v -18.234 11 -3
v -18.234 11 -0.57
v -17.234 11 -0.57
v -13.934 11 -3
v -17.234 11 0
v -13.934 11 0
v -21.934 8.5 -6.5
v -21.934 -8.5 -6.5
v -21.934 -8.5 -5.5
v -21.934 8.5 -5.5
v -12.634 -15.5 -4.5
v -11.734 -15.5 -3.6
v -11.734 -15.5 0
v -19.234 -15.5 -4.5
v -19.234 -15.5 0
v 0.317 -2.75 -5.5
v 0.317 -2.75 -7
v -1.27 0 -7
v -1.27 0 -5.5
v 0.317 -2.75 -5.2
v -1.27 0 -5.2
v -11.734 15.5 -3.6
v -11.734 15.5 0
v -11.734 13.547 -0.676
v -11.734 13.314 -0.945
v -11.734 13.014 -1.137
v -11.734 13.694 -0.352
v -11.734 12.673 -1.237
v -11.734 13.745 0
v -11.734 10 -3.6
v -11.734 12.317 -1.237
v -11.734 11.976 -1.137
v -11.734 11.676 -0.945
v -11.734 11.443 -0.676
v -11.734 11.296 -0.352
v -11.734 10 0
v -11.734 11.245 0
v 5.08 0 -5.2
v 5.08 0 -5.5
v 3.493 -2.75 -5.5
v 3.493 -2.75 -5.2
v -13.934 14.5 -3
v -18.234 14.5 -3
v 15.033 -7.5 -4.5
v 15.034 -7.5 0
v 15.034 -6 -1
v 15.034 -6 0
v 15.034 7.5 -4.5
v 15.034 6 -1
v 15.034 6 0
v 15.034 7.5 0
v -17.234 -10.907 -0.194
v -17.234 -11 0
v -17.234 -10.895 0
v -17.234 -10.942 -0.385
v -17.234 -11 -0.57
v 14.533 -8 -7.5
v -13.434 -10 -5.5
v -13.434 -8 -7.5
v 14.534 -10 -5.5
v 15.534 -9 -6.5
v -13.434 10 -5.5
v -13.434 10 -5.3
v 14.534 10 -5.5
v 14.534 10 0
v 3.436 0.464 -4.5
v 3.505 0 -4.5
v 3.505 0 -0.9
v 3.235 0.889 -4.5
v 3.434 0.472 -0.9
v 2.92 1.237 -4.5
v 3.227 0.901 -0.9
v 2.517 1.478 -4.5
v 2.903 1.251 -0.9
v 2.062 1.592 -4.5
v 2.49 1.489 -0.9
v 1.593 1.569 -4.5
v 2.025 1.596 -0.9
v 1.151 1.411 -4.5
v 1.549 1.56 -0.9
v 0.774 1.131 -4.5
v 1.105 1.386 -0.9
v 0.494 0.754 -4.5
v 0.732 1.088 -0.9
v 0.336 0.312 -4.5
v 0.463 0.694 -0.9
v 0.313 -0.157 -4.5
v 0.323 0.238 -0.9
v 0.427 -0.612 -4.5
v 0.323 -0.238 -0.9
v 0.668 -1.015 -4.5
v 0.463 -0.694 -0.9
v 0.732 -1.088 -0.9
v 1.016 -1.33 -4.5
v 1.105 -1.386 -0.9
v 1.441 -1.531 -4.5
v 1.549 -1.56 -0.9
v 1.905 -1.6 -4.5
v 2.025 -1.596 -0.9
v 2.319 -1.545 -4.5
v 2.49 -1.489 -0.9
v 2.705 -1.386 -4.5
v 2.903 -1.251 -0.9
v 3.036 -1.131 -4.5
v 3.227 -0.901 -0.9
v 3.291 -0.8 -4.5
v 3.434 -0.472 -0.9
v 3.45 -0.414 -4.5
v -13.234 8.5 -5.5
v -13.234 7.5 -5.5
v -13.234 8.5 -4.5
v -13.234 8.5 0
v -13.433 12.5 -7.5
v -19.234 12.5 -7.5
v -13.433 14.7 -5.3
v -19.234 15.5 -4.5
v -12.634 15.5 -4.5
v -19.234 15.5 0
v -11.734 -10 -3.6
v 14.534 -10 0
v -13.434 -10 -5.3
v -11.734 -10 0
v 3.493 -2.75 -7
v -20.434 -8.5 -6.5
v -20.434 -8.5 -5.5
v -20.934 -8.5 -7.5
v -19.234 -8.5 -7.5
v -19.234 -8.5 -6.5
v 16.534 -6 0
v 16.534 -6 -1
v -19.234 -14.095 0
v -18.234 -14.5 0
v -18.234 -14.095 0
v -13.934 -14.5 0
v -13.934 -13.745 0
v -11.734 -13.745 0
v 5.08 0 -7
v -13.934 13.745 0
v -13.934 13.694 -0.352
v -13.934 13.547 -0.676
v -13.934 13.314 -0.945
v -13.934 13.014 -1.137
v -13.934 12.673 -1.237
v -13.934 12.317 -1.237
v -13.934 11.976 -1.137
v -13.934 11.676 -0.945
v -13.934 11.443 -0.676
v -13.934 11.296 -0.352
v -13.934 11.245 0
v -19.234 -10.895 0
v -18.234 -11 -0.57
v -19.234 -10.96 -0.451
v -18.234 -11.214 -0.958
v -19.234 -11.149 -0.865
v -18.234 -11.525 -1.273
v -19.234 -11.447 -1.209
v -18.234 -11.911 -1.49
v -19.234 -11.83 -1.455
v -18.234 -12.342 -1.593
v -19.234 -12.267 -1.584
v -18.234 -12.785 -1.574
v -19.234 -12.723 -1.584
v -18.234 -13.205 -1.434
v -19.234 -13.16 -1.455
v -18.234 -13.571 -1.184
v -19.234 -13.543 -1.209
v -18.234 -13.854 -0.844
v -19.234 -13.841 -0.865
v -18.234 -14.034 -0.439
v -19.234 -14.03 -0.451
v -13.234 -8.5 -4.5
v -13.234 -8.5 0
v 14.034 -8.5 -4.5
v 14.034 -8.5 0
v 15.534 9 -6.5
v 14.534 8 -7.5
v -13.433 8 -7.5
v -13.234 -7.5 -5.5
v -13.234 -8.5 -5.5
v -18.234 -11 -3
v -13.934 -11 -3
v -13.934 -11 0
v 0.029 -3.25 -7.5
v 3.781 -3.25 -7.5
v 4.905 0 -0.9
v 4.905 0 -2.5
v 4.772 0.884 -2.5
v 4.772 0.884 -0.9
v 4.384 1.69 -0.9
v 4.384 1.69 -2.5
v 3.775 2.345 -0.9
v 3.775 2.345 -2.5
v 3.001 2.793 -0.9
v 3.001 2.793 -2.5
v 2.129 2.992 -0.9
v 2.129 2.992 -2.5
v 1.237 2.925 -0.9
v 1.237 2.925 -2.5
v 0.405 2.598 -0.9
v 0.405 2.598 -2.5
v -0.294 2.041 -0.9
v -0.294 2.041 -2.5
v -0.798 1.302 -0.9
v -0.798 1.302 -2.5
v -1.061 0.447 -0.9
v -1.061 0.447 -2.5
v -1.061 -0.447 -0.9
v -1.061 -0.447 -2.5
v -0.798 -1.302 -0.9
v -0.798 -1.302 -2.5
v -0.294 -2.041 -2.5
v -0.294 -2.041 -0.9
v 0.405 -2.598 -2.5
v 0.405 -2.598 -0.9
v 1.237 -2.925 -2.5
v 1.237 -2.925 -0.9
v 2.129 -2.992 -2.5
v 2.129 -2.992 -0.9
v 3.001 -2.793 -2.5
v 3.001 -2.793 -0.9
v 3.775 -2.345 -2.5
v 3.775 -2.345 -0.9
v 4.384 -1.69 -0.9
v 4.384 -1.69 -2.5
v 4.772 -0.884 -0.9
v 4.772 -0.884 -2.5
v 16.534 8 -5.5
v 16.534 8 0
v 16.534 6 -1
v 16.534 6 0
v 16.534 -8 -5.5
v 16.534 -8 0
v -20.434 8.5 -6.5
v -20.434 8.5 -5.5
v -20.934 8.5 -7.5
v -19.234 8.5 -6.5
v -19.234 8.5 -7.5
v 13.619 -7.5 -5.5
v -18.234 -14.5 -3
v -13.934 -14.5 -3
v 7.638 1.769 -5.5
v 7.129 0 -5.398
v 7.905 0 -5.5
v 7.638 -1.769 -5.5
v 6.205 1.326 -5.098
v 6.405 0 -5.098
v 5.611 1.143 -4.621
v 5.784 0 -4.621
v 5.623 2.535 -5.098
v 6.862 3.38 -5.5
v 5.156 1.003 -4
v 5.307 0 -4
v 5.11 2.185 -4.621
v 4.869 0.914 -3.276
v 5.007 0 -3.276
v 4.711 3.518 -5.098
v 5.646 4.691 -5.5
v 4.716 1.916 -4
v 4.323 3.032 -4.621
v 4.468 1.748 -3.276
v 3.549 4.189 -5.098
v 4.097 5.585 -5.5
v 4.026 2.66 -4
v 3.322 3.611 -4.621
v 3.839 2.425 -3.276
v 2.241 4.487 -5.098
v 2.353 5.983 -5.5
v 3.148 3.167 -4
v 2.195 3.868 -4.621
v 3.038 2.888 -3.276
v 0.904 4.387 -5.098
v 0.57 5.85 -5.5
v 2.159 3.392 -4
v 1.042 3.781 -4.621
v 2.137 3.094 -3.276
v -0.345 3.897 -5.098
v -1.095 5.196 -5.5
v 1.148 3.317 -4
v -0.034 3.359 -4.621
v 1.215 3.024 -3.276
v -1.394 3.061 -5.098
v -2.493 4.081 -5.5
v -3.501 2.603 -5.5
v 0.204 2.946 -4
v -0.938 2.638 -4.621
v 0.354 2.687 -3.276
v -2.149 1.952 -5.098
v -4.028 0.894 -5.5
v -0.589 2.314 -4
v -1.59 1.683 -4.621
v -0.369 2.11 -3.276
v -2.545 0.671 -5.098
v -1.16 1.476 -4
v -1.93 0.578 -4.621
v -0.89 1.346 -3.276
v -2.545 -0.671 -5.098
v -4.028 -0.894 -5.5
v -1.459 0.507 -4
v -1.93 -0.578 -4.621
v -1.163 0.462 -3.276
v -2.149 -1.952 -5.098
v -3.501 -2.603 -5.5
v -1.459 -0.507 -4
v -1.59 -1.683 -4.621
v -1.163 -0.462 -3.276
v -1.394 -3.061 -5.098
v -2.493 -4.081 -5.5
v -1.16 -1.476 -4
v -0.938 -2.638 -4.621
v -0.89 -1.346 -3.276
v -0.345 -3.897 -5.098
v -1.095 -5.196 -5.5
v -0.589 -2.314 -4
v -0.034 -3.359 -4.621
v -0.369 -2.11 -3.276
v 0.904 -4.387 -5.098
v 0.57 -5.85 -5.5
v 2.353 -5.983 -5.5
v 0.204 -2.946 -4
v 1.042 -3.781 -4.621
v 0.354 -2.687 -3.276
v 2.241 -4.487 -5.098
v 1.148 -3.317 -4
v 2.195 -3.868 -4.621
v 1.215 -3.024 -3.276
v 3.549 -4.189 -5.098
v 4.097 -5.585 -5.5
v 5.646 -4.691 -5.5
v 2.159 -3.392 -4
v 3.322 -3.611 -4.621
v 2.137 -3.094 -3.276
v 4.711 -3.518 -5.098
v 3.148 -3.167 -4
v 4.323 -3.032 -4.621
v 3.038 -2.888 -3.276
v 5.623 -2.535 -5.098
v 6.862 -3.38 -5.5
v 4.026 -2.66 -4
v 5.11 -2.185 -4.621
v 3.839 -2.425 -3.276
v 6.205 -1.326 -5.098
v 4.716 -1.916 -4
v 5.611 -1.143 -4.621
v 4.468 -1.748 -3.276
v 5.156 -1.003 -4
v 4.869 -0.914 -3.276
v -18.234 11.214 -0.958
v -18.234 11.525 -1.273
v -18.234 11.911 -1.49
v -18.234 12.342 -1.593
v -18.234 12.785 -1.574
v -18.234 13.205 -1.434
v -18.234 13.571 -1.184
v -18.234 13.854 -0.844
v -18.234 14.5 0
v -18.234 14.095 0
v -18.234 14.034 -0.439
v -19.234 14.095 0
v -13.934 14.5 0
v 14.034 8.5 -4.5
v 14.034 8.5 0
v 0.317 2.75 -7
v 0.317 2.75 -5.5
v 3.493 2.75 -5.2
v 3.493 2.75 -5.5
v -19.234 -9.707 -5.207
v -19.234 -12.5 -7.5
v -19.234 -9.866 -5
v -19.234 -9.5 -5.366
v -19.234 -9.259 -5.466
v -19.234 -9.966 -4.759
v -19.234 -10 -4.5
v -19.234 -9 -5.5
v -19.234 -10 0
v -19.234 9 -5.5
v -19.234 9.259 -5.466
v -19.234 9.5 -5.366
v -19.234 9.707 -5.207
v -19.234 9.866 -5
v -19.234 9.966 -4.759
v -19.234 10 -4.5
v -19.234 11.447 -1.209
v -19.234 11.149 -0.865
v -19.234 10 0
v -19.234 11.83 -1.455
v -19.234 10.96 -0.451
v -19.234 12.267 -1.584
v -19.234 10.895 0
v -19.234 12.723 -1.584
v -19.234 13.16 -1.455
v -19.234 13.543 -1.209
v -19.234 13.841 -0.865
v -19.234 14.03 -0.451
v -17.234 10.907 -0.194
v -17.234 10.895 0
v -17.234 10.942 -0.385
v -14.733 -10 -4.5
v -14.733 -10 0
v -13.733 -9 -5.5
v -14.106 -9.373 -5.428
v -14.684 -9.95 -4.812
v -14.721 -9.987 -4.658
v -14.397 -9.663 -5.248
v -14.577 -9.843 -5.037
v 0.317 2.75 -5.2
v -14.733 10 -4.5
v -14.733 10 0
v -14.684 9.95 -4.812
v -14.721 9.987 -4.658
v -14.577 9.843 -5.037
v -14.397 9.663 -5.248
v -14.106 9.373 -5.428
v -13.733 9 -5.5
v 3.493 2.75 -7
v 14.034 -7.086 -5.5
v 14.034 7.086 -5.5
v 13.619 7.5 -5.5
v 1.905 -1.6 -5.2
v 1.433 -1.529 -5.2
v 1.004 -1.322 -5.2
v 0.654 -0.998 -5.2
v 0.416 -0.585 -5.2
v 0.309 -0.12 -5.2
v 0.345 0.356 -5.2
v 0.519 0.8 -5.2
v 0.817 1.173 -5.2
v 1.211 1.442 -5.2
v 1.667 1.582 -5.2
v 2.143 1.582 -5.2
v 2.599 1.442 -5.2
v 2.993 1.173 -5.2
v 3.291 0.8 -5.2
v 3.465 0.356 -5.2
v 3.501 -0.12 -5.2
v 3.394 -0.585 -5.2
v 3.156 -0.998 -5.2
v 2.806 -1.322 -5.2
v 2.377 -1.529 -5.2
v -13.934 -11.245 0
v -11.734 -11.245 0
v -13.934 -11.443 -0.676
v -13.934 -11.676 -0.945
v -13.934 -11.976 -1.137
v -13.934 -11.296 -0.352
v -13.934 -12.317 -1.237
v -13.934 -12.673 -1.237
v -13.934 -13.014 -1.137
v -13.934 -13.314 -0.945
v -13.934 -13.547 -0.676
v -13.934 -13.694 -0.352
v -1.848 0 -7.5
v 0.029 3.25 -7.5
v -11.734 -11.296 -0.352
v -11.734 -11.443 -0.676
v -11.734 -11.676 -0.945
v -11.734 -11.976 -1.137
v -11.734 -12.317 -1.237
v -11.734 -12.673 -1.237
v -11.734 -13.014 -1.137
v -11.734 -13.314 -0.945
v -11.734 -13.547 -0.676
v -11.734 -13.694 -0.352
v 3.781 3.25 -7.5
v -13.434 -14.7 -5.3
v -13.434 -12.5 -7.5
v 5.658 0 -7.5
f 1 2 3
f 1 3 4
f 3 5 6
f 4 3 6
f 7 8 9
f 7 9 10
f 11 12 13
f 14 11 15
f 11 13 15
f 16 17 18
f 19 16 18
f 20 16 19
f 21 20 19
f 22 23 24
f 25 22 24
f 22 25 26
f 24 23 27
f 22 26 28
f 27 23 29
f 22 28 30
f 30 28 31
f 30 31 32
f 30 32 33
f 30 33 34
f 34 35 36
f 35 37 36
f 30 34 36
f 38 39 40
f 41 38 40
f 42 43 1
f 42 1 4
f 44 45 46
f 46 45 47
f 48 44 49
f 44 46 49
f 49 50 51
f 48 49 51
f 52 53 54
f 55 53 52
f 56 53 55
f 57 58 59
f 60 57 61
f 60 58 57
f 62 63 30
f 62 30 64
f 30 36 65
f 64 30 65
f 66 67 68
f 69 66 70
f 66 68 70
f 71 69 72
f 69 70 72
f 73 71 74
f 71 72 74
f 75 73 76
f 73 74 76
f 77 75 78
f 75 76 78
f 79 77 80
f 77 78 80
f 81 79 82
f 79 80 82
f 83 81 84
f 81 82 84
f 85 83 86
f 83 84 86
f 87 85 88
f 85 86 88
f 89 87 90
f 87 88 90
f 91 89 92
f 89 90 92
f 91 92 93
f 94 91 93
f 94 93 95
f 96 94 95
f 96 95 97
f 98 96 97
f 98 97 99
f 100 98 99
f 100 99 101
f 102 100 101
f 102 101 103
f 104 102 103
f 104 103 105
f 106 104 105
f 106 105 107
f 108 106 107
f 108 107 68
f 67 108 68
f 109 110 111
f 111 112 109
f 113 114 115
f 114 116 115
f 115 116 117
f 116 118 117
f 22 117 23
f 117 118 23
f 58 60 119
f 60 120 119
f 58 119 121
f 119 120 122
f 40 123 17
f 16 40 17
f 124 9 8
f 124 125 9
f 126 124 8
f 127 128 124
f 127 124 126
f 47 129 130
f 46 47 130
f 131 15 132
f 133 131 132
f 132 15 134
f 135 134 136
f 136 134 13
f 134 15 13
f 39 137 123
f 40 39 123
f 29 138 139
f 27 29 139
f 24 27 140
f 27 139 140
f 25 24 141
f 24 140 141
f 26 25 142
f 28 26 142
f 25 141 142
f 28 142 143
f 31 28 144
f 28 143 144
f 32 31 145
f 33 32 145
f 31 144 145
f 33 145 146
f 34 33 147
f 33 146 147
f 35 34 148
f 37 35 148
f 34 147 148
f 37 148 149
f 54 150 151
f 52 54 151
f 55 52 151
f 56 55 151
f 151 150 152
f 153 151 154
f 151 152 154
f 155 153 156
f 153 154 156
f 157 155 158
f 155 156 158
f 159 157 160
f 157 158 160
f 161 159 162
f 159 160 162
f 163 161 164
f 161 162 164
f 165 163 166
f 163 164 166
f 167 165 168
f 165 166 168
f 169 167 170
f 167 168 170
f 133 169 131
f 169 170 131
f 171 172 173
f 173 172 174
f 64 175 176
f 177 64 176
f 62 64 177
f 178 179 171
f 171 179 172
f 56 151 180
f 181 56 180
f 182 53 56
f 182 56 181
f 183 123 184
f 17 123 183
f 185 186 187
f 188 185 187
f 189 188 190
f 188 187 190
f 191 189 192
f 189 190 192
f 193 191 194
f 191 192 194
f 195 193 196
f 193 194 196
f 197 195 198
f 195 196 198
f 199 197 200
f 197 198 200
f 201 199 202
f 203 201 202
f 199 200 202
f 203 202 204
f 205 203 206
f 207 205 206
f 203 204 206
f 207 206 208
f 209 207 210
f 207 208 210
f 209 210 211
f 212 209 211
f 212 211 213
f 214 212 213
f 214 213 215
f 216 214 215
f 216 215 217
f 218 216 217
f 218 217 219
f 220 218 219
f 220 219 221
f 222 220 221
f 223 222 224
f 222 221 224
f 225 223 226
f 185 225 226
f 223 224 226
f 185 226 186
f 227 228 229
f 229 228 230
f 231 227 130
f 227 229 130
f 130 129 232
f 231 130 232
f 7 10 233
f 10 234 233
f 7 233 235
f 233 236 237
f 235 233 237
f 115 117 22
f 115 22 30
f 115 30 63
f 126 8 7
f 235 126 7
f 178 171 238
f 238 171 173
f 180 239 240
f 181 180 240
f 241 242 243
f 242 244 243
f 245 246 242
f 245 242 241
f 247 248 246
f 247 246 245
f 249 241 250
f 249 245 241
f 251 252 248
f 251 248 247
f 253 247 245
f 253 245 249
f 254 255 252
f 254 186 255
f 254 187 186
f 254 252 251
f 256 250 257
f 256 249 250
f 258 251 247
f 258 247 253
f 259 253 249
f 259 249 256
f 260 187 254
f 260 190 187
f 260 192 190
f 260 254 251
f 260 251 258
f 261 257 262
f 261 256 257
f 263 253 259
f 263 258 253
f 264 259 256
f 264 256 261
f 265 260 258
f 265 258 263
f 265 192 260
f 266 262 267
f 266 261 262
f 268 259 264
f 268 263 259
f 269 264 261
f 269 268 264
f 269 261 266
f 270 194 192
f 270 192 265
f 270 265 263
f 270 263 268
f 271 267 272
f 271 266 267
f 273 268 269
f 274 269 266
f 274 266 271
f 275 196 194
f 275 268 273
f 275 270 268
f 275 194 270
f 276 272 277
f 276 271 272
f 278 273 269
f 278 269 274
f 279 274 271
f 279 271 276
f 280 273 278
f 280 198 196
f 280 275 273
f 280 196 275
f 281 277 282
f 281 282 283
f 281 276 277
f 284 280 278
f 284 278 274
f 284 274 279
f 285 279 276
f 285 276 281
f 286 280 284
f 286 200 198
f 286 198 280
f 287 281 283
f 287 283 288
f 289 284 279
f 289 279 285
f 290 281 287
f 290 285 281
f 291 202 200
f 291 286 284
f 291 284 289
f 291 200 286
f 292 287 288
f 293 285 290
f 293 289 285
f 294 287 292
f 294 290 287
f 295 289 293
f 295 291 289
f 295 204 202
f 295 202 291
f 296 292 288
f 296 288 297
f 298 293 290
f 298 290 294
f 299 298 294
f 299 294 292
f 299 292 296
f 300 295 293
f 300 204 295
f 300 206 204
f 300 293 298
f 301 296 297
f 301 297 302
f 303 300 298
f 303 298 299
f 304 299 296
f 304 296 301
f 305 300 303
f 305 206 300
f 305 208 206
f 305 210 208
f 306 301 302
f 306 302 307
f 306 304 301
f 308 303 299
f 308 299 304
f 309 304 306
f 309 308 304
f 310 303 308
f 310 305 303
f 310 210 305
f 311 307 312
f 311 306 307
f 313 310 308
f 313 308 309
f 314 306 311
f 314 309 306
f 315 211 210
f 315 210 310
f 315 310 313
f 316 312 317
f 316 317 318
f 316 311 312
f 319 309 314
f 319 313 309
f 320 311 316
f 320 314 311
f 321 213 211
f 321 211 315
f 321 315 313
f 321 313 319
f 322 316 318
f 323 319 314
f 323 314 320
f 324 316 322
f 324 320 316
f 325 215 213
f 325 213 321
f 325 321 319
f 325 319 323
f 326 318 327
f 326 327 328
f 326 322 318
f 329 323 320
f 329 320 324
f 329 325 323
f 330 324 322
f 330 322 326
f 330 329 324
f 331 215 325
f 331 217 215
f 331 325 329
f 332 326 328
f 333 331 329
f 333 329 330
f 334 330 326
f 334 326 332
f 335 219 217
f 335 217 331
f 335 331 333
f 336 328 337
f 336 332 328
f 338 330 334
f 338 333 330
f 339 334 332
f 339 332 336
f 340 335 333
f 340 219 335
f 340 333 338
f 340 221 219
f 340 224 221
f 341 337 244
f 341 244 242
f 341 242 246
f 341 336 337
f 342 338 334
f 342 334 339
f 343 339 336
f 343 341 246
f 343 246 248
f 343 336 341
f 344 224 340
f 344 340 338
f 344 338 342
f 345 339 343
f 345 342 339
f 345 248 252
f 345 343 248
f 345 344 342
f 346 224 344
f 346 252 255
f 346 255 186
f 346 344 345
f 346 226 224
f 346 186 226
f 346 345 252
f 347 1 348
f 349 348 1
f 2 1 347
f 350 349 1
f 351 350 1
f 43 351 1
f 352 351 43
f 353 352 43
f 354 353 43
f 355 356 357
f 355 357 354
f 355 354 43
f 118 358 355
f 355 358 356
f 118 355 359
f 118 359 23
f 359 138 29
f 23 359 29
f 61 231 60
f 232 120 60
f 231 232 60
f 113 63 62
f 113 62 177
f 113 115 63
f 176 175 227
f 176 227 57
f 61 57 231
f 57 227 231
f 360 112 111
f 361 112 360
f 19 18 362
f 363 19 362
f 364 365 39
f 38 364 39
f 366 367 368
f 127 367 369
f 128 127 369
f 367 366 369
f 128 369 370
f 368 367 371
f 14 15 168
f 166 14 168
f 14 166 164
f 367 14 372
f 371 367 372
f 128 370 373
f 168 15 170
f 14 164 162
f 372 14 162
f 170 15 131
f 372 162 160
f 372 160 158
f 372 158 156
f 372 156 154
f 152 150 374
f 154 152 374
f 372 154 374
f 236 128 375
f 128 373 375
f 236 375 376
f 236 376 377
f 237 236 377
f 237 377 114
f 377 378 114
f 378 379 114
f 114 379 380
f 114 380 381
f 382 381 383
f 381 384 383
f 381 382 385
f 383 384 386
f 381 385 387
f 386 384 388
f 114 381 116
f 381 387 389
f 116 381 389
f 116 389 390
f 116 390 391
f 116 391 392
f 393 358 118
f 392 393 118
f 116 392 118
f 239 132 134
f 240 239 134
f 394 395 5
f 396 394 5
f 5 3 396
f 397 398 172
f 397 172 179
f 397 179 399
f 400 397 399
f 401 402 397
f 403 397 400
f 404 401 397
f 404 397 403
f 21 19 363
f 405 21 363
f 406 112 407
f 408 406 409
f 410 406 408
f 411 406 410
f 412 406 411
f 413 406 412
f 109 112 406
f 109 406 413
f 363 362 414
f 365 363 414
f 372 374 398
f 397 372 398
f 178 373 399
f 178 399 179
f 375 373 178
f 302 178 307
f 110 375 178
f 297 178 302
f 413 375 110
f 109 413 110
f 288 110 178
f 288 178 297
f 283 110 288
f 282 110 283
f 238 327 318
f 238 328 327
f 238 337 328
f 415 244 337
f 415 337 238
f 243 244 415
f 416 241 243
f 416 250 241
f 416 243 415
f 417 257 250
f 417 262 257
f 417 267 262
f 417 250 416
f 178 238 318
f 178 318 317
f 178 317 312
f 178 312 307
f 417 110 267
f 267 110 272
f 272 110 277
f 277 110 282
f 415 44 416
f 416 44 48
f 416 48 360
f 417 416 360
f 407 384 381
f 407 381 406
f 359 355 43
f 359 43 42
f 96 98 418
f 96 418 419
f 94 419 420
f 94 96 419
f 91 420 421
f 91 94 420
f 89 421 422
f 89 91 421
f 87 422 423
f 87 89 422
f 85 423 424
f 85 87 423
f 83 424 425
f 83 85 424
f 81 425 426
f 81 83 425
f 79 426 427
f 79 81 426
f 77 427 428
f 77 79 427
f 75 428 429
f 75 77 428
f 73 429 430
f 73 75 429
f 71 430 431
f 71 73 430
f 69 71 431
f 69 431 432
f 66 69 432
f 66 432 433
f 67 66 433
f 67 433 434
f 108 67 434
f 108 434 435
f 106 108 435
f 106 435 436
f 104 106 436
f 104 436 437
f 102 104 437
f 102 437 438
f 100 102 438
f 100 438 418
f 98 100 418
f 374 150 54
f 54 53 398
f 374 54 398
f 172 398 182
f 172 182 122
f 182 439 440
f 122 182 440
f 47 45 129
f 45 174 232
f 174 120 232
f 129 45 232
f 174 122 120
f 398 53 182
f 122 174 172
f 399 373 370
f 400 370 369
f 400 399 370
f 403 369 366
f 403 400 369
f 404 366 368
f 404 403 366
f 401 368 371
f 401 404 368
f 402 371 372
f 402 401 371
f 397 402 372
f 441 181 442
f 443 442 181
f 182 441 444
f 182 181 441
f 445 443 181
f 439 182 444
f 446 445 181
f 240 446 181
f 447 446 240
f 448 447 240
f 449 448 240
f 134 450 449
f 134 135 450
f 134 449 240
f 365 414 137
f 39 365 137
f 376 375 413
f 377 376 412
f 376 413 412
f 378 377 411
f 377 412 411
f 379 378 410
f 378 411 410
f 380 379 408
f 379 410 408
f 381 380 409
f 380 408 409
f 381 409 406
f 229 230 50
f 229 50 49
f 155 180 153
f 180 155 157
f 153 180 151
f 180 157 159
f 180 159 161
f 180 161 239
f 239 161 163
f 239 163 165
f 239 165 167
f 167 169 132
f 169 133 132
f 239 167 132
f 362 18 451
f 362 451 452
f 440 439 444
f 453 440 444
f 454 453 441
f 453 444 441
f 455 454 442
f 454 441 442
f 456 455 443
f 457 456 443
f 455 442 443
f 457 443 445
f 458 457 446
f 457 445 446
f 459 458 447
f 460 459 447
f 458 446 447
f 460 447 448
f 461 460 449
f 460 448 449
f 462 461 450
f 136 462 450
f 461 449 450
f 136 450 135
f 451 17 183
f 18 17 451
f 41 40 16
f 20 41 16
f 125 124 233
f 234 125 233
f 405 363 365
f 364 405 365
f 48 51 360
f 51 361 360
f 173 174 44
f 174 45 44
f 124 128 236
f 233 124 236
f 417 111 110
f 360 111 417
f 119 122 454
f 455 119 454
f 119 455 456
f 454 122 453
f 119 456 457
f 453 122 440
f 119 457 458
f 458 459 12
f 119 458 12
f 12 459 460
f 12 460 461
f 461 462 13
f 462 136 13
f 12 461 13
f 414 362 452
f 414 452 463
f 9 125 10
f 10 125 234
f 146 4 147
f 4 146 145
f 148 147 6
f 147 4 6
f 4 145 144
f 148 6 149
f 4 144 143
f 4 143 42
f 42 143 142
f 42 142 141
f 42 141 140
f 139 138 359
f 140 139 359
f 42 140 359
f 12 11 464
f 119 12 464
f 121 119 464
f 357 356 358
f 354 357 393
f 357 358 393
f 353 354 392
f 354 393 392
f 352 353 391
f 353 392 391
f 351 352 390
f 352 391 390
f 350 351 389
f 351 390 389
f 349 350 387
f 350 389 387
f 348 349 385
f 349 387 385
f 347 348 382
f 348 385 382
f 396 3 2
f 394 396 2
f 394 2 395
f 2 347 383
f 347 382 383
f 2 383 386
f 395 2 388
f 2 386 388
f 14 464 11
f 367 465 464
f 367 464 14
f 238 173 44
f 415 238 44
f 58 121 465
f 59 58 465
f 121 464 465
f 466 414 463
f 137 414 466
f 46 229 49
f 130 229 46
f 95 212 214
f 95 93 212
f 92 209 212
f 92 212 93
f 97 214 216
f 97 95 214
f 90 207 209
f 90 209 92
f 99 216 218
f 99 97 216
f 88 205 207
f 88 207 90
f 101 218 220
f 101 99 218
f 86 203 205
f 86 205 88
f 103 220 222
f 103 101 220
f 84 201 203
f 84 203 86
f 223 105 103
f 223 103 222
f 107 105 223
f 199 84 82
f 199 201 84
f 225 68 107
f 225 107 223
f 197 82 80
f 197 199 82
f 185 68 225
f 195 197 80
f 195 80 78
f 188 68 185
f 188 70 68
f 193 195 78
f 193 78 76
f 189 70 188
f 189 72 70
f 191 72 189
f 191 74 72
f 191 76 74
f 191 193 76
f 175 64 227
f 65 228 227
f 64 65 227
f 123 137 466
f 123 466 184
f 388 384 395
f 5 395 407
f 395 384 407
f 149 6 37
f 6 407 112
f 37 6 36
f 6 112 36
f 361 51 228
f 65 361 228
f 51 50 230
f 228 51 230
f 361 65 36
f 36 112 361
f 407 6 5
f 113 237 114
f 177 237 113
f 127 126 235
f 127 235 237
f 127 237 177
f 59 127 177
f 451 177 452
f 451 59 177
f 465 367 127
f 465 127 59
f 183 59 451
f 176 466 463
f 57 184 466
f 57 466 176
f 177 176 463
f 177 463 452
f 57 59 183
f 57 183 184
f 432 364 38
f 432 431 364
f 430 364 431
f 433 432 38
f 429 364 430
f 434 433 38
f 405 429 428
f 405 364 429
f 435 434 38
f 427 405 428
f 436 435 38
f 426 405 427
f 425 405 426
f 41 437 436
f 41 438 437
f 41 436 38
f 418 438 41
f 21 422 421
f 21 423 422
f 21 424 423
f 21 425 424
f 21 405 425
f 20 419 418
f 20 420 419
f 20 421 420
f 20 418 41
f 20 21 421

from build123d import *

# Parameters (mm, degrees)
PAD004_DEPTH            = 8.5
SKETCH014_W             = 34.267
SKETCH014_H             = 17
POCKET008_DEPTH         = 5.5
SKETCH015_W             = 6
SKETCH015_H             = 20
POCKET009_DEPTH         = 5.5
SKETCH016_W             = 4.3
SKETCH016_H             = 3.5
POCKET010_DEPTH         = 3
SKETCH017_R             = 1.25
POCKET011_DEPTH         = 35.768
CHAMFER007_SIZE         = 1.49999
POCKET012_DEPTH         = 5.5
CHAMFER008_SIZE         = 4
SKETCH019_W             = 17
SKETCH019_H             = 2
PAD005_DEPTH            = 1.2
SKETCH020_W             = 17
SKETCH020_H             = 3
PAD006_DEPTH            = 1.5
CHAMFER009_SIZE         = 2
SKETCH021_R             = 3
PAD007_DEPTH            = 4.6
FILLET001_R             = 3
CHAMFER010_SIZE         = 3
CHAMFER011_SIZE         = 1
CHAMFER012_SIZE         = 2
SKETCH022_W             = 71.294541
SKETCH022_H             = 63.230997
POCKET013_DEPTH         = 1
SKETCH023_R             = 1.6
POCKET014_DEPTH         = 6.601
POCKET015_DEPTH         = 3
CHAMFER013_SIZE         = 0.5
CHAMFER015_SIZE         = 1
FILLET002_R             = 1
SKETCH028_R             = 1.6
POCKET018_DEPTH         = 2
SKETCH029_W             = 12
SKETCH029_H             = 1
POCKET019_DEPTH         = 5
POCKET019_FACE86_R      = 1.6
PAD010_DEPTH            = 1
PAD010_FACE85_R         = 1.6
POCKET022_DEPTH         = 0.3
BODY001_PLACEMENT_ANGLE = 180


with BuildPart() as part:
    # Sketch013 → Pad004 (new body)
    with BuildSketch(Plane.XY):
        Polygon((-11.7335, -10), (16.5335, -10), (16.5335, 10), (-11.7335, 10), (-11.7335, 15.5), (-19.2335, 15.5), (-19.2335, -15.5), (-11.7335, -15.5), align=None)
    extrude(amount=PAD004_DEPTH)

    # Sketch014 (on Face9 of Pad004) → Pocket008 (cut)
    with BuildSketch(Plane(origin=(0, 0, 0), x_dir=(1, 0, 0), z_dir=(0, 0, -1))):
        with Locations((-2.1, 0)):
            Rectangle(SKETCH014_W, SKETCH014_H)
    extrude(amount=-POCKET008_DEPTH, mode=Mode.SUBTRACT)

    # Sketch015 (on Face4 of Pocket008) → Pocket009 (cut)
    with BuildSketch(Plane(origin=(0, 0, 0), x_dir=(1, 0, 0), z_dir=(0, 0, -1))):
        with Locations((-16.2335, 0)):
            Rectangle(SKETCH015_W, SKETCH015_H)
    extrude(amount=-POCKET009_DEPTH, mode=Mode.SUBTRACT)

    # Sketch016 (on Face4 of Pocket009) → Pocket010 (cut)
    with BuildSketch(Plane(origin=(0, 0, 0), x_dir=(1, 0, 0), z_dir=(0, 0, -1))):
        with Locations((-16.0835, 12.75)):
            Rectangle(SKETCH016_W, SKETCH016_H)
    pocket010 = extrude(amount=-POCKET010_DEPTH, mode=Mode.SUBTRACT)

    # Mirrored002: Pocket010 across Sketch016 H_Axis
    add(pocket010.mirror(Plane(origin=(0, 0, 0), x_dir=(0, 0, -1), z_dir=(0, -1, 0))), mode=Mode.SUBTRACT)

    # Sketch017 (on Face8 of Mirrored002) → Pocket011 (cut, through all)
    with BuildSketch(Plane(origin=(-19.2335, 0, 0), x_dir=(0, -1, 0), z_dir=(-1, 0, 0))):
        with Locations((12.495, 0)):
            Circle(SKETCH017_R)
        with Locations((-12.495, 0)):
            Circle(SKETCH017_R)
    extrude(amount=-POCKET011_DEPTH, mode=Mode.SUBTRACT)

    # Chamfer007
    chamfer007_edges = [part.edges().sort_by_distance(p)[0] for p in [
        (-13.2335, 10, 2.75),
        (-13.2335, -10, 2.75),
    ]]
    chamfer(chamfer007_edges, length=CHAMFER007_SIZE)

    # Sketch018 (on Face8 of Pocket011) → Pocket012 (cut)
    with BuildSketch(Plane.XZ.offset(15.5)):
        Polygon((-11.7335, 3.6), (-13.4335, 5.3), (-13.4335, 8.5), (-11.7335, 8.5), align=None)
    pocket012 = extrude(amount=-POCKET012_DEPTH, mode=Mode.SUBTRACT)

    # Mirrored003: Pocket012 across XZ
    add(pocket012.mirror(Plane.XZ), mode=Mode.SUBTRACT)

    # Chamfer008
    chamfer008_edges = [part.edges().sort_by_distance(p)[0] for p in [
        (-16.3335, -15.5, 8.5),
        (-16.3335, 15.5, 8.5),
    ]]
    chamfer(chamfer008_edges, length=CHAMFER008_SIZE)

    # Sketch019 (on Face1 of Chamfer008) → Pad005 (join)
    with BuildSketch(Plane(origin=(-19.2335, 0, 0), x_dir=(0, -1, 0), z_dir=(-1, 0, 0))):
        with Locations((0, 7.5)):
            Rectangle(SKETCH019_W, SKETCH019_H)
    extrude(amount=PAD005_DEPTH)

    # Sketch020 (on Face23 of Pad005) → Pad006 (join)
    with BuildSketch(Plane(origin=(-20.4335, 0, 0), x_dir=(0, -1, 0), z_dir=(-1, 0, 0))):
        with Locations((0, 7)):
            Rectangle(SKETCH020_W, SKETCH020_H)
    extrude(amount=PAD006_DEPTH)

    # Chamfer009
    chamfer009_edges = [part.edges().sort_by_distance(p)[0] for p in [
        (-21.9335, 0, 8.5),
    ]]
    chamfer(chamfer009_edges, length=CHAMFER009_SIZE)

    # Sketch021 → Pad007 (join)
    with BuildSketch(Plane(origin=(0, 0, 5.5), x_dir=(1, 0, 0), z_dir=(0, 0, -1))):
        with Locations((1.905, 0)):
            Circle(SKETCH021_R)
    extrude(amount=PAD007_DEPTH)

    # Fillet001
    fillet001_edges = [part.edges().sort_by_distance(p)[0] for p in [
        (-1.095, 0, 5.5),
    ]]
    fillet(fillet001_edges, radius=FILLET001_R)

    # Chamfer010
    chamfer010_edges = [part.edges().sort_by_distance(p)[0] for p in [
        (1.55, -10, 8.5),
        (16.5335, 0, 8.5),
        (1.55, 10, 8.5),
    ]]
    chamfer(chamfer010_edges, length=CHAMFER010_SIZE)

    # Chamfer011
    chamfer011_edges = [part.edges().sort_by_distance(p)[0] for p in [
        (15.0335, -8.5, 2.75),
        (15.0335, 8.5, 2.75),
    ]]
    chamfer(chamfer011_edges, length=CHAMFER011_SIZE)

    # Chamfer012
    chamfer012_edges = [part.edges().sort_by_distance(p)[0] for p in [
        (16.5335, -10, 2.75),
        (16.5335, 10, 2.75),
    ]]
    chamfer(chamfer012_edges, length=CHAMFER012_SIZE)

    # Sketch022 (on Face47 of Chamfer012) → Pocket013 (cut)
    with BuildSketch(Plane.XY.offset(8.5)):
        with Locations((3.279843, 6.184065)):
            Rectangle(SKETCH022_W, SKETCH022_H)
    extrude(amount=-POCKET013_DEPTH, mode=Mode.SUBTRACT)

    # Sketch023 (on Face59 of Pocket013) → Pocket014 (cut, through all)
    with BuildSketch(Plane(origin=(0, 0, 0.9), x_dir=(1, 0, 0), z_dir=(0, 0, -1))):
        with Locations((1.905, 0)):
            Circle(SKETCH023_R)
    extrude(amount=-POCKET014_DEPTH, mode=Mode.SUBTRACT)

    # Sketch024 (on Face47 of Pocket014) → Pocket015 (cut)
    with BuildSketch(Plane.XY.offset(7.5)):
        Polygon((3.492713, 2.75), (0.317287, 2.75), (-1.270426, 0), (0.317287, -2.75), (3.492713, -2.75), (5.080426, 0), align=None)
    extrude(amount=-POCKET015_DEPTH, mode=Mode.SUBTRACT)

    # Chamfer013
    chamfer013_edges = [part.edges().sort_by_distance(p)[0] for p in [
        (4.28657, 1.375, 7.5),
        (1.905, 2.75, 7.5),
        (-0.47657, 1.375, 7.5),
        (-0.47657, -1.375, 7.5),
        (1.905, -2.75, 7.5),
        (4.28657, -1.375, 7.5),
    ]]
    chamfer(chamfer013_edges, length=CHAMFER013_SIZE)

    # Chamfer015
    chamfer015_edges = [part.edges().sort_by_distance(p)[0] for p in [
        (0.4, 8.5, 5.5),
        (14.5335, 8, 5.5),
        (15.0335, 0, 5.5),
        (0.4, -8.5, 5.5),
        (14.5335, -8, 5.5),
    ]]
    chamfer(chamfer015_edges, length=CHAMFER015_SIZE)

    # Fillet002
    fillet002_edges = [part.edges().sort_by_distance(p)[0] for p in [
        (-16.983495, 10, 5.5),
        (-16.983495, -10, 5.5),
    ]]
    fillet(fillet002_edges, radius=FILLET002_R)

    # Sketch028 (on Face5 of Fillet002) → Pocket018 (cut)
    with BuildSketch(Plane(origin=(-19.2335, 0, 0), x_dir=(0, -1, 0), z_dir=(-1, 0, 0))):
        with Locations((-12.495, 0)):
            Circle(SKETCH028_R)
        with Locations((12.495, 0)):
            Circle(SKETCH028_R)
    extrude(amount=-POCKET018_DEPTH, mode=Mode.SUBTRACT)

    # Sketch029 (on Face49 of Pocket018) → Pocket019 (cut)
    with BuildSketch(Plane.YZ.offset(16.5335)):
        with Locations((0, 0.5)):
            Rectangle(SKETCH029_W, SKETCH029_H)
    extrude(amount=-POCKET019_DEPTH, mode=Mode.SUBTRACT)

    # Pocket019 Face86 → Pad010 (add)
    with BuildSketch(Plane(origin=(1.905, 0, 4.5), x_dir=(0, 1, 0), z_dir=(0, 0, 1))):
        Polygon((2.75, -1.587713), (2.75, 1.587713), (0, 3.175426), (-2.75, 1.587713), (-2.75, -1.587713), (0, -3.175426), align=None)
        Circle(POCKET019_FACE86_R, mode=Mode.SUBTRACT)
    extrude(amount=PAD010_DEPTH)

    # Pad010 Face85 → Pocket022 (cut)
    with BuildSketch(Plane(origin=(1.905, 0, 5.5), x_dir=(0, 1, 0), z_dir=(0, 0, 1))):
        Polygon((2.75, -1.587713), (2.75, 1.587713), (0, 3.175426), (-2.75, 1.587713), (-2.75, -1.587713), (0, -3.175426), align=None)
        Circle(PAD010_FACE85_R, mode=Mode.SUBTRACT)
    extrude(amount=-POCKET022_DEPTH, mode=Mode.SUBTRACT)


with BuildPart() as part_1:
    # Body001 placement: moved
    add(part.part.rotate(Axis((0, 0, 0), (1, 0, 0)), BODY001_PLACEMENT_ANGLE))


solid = part_1.part
